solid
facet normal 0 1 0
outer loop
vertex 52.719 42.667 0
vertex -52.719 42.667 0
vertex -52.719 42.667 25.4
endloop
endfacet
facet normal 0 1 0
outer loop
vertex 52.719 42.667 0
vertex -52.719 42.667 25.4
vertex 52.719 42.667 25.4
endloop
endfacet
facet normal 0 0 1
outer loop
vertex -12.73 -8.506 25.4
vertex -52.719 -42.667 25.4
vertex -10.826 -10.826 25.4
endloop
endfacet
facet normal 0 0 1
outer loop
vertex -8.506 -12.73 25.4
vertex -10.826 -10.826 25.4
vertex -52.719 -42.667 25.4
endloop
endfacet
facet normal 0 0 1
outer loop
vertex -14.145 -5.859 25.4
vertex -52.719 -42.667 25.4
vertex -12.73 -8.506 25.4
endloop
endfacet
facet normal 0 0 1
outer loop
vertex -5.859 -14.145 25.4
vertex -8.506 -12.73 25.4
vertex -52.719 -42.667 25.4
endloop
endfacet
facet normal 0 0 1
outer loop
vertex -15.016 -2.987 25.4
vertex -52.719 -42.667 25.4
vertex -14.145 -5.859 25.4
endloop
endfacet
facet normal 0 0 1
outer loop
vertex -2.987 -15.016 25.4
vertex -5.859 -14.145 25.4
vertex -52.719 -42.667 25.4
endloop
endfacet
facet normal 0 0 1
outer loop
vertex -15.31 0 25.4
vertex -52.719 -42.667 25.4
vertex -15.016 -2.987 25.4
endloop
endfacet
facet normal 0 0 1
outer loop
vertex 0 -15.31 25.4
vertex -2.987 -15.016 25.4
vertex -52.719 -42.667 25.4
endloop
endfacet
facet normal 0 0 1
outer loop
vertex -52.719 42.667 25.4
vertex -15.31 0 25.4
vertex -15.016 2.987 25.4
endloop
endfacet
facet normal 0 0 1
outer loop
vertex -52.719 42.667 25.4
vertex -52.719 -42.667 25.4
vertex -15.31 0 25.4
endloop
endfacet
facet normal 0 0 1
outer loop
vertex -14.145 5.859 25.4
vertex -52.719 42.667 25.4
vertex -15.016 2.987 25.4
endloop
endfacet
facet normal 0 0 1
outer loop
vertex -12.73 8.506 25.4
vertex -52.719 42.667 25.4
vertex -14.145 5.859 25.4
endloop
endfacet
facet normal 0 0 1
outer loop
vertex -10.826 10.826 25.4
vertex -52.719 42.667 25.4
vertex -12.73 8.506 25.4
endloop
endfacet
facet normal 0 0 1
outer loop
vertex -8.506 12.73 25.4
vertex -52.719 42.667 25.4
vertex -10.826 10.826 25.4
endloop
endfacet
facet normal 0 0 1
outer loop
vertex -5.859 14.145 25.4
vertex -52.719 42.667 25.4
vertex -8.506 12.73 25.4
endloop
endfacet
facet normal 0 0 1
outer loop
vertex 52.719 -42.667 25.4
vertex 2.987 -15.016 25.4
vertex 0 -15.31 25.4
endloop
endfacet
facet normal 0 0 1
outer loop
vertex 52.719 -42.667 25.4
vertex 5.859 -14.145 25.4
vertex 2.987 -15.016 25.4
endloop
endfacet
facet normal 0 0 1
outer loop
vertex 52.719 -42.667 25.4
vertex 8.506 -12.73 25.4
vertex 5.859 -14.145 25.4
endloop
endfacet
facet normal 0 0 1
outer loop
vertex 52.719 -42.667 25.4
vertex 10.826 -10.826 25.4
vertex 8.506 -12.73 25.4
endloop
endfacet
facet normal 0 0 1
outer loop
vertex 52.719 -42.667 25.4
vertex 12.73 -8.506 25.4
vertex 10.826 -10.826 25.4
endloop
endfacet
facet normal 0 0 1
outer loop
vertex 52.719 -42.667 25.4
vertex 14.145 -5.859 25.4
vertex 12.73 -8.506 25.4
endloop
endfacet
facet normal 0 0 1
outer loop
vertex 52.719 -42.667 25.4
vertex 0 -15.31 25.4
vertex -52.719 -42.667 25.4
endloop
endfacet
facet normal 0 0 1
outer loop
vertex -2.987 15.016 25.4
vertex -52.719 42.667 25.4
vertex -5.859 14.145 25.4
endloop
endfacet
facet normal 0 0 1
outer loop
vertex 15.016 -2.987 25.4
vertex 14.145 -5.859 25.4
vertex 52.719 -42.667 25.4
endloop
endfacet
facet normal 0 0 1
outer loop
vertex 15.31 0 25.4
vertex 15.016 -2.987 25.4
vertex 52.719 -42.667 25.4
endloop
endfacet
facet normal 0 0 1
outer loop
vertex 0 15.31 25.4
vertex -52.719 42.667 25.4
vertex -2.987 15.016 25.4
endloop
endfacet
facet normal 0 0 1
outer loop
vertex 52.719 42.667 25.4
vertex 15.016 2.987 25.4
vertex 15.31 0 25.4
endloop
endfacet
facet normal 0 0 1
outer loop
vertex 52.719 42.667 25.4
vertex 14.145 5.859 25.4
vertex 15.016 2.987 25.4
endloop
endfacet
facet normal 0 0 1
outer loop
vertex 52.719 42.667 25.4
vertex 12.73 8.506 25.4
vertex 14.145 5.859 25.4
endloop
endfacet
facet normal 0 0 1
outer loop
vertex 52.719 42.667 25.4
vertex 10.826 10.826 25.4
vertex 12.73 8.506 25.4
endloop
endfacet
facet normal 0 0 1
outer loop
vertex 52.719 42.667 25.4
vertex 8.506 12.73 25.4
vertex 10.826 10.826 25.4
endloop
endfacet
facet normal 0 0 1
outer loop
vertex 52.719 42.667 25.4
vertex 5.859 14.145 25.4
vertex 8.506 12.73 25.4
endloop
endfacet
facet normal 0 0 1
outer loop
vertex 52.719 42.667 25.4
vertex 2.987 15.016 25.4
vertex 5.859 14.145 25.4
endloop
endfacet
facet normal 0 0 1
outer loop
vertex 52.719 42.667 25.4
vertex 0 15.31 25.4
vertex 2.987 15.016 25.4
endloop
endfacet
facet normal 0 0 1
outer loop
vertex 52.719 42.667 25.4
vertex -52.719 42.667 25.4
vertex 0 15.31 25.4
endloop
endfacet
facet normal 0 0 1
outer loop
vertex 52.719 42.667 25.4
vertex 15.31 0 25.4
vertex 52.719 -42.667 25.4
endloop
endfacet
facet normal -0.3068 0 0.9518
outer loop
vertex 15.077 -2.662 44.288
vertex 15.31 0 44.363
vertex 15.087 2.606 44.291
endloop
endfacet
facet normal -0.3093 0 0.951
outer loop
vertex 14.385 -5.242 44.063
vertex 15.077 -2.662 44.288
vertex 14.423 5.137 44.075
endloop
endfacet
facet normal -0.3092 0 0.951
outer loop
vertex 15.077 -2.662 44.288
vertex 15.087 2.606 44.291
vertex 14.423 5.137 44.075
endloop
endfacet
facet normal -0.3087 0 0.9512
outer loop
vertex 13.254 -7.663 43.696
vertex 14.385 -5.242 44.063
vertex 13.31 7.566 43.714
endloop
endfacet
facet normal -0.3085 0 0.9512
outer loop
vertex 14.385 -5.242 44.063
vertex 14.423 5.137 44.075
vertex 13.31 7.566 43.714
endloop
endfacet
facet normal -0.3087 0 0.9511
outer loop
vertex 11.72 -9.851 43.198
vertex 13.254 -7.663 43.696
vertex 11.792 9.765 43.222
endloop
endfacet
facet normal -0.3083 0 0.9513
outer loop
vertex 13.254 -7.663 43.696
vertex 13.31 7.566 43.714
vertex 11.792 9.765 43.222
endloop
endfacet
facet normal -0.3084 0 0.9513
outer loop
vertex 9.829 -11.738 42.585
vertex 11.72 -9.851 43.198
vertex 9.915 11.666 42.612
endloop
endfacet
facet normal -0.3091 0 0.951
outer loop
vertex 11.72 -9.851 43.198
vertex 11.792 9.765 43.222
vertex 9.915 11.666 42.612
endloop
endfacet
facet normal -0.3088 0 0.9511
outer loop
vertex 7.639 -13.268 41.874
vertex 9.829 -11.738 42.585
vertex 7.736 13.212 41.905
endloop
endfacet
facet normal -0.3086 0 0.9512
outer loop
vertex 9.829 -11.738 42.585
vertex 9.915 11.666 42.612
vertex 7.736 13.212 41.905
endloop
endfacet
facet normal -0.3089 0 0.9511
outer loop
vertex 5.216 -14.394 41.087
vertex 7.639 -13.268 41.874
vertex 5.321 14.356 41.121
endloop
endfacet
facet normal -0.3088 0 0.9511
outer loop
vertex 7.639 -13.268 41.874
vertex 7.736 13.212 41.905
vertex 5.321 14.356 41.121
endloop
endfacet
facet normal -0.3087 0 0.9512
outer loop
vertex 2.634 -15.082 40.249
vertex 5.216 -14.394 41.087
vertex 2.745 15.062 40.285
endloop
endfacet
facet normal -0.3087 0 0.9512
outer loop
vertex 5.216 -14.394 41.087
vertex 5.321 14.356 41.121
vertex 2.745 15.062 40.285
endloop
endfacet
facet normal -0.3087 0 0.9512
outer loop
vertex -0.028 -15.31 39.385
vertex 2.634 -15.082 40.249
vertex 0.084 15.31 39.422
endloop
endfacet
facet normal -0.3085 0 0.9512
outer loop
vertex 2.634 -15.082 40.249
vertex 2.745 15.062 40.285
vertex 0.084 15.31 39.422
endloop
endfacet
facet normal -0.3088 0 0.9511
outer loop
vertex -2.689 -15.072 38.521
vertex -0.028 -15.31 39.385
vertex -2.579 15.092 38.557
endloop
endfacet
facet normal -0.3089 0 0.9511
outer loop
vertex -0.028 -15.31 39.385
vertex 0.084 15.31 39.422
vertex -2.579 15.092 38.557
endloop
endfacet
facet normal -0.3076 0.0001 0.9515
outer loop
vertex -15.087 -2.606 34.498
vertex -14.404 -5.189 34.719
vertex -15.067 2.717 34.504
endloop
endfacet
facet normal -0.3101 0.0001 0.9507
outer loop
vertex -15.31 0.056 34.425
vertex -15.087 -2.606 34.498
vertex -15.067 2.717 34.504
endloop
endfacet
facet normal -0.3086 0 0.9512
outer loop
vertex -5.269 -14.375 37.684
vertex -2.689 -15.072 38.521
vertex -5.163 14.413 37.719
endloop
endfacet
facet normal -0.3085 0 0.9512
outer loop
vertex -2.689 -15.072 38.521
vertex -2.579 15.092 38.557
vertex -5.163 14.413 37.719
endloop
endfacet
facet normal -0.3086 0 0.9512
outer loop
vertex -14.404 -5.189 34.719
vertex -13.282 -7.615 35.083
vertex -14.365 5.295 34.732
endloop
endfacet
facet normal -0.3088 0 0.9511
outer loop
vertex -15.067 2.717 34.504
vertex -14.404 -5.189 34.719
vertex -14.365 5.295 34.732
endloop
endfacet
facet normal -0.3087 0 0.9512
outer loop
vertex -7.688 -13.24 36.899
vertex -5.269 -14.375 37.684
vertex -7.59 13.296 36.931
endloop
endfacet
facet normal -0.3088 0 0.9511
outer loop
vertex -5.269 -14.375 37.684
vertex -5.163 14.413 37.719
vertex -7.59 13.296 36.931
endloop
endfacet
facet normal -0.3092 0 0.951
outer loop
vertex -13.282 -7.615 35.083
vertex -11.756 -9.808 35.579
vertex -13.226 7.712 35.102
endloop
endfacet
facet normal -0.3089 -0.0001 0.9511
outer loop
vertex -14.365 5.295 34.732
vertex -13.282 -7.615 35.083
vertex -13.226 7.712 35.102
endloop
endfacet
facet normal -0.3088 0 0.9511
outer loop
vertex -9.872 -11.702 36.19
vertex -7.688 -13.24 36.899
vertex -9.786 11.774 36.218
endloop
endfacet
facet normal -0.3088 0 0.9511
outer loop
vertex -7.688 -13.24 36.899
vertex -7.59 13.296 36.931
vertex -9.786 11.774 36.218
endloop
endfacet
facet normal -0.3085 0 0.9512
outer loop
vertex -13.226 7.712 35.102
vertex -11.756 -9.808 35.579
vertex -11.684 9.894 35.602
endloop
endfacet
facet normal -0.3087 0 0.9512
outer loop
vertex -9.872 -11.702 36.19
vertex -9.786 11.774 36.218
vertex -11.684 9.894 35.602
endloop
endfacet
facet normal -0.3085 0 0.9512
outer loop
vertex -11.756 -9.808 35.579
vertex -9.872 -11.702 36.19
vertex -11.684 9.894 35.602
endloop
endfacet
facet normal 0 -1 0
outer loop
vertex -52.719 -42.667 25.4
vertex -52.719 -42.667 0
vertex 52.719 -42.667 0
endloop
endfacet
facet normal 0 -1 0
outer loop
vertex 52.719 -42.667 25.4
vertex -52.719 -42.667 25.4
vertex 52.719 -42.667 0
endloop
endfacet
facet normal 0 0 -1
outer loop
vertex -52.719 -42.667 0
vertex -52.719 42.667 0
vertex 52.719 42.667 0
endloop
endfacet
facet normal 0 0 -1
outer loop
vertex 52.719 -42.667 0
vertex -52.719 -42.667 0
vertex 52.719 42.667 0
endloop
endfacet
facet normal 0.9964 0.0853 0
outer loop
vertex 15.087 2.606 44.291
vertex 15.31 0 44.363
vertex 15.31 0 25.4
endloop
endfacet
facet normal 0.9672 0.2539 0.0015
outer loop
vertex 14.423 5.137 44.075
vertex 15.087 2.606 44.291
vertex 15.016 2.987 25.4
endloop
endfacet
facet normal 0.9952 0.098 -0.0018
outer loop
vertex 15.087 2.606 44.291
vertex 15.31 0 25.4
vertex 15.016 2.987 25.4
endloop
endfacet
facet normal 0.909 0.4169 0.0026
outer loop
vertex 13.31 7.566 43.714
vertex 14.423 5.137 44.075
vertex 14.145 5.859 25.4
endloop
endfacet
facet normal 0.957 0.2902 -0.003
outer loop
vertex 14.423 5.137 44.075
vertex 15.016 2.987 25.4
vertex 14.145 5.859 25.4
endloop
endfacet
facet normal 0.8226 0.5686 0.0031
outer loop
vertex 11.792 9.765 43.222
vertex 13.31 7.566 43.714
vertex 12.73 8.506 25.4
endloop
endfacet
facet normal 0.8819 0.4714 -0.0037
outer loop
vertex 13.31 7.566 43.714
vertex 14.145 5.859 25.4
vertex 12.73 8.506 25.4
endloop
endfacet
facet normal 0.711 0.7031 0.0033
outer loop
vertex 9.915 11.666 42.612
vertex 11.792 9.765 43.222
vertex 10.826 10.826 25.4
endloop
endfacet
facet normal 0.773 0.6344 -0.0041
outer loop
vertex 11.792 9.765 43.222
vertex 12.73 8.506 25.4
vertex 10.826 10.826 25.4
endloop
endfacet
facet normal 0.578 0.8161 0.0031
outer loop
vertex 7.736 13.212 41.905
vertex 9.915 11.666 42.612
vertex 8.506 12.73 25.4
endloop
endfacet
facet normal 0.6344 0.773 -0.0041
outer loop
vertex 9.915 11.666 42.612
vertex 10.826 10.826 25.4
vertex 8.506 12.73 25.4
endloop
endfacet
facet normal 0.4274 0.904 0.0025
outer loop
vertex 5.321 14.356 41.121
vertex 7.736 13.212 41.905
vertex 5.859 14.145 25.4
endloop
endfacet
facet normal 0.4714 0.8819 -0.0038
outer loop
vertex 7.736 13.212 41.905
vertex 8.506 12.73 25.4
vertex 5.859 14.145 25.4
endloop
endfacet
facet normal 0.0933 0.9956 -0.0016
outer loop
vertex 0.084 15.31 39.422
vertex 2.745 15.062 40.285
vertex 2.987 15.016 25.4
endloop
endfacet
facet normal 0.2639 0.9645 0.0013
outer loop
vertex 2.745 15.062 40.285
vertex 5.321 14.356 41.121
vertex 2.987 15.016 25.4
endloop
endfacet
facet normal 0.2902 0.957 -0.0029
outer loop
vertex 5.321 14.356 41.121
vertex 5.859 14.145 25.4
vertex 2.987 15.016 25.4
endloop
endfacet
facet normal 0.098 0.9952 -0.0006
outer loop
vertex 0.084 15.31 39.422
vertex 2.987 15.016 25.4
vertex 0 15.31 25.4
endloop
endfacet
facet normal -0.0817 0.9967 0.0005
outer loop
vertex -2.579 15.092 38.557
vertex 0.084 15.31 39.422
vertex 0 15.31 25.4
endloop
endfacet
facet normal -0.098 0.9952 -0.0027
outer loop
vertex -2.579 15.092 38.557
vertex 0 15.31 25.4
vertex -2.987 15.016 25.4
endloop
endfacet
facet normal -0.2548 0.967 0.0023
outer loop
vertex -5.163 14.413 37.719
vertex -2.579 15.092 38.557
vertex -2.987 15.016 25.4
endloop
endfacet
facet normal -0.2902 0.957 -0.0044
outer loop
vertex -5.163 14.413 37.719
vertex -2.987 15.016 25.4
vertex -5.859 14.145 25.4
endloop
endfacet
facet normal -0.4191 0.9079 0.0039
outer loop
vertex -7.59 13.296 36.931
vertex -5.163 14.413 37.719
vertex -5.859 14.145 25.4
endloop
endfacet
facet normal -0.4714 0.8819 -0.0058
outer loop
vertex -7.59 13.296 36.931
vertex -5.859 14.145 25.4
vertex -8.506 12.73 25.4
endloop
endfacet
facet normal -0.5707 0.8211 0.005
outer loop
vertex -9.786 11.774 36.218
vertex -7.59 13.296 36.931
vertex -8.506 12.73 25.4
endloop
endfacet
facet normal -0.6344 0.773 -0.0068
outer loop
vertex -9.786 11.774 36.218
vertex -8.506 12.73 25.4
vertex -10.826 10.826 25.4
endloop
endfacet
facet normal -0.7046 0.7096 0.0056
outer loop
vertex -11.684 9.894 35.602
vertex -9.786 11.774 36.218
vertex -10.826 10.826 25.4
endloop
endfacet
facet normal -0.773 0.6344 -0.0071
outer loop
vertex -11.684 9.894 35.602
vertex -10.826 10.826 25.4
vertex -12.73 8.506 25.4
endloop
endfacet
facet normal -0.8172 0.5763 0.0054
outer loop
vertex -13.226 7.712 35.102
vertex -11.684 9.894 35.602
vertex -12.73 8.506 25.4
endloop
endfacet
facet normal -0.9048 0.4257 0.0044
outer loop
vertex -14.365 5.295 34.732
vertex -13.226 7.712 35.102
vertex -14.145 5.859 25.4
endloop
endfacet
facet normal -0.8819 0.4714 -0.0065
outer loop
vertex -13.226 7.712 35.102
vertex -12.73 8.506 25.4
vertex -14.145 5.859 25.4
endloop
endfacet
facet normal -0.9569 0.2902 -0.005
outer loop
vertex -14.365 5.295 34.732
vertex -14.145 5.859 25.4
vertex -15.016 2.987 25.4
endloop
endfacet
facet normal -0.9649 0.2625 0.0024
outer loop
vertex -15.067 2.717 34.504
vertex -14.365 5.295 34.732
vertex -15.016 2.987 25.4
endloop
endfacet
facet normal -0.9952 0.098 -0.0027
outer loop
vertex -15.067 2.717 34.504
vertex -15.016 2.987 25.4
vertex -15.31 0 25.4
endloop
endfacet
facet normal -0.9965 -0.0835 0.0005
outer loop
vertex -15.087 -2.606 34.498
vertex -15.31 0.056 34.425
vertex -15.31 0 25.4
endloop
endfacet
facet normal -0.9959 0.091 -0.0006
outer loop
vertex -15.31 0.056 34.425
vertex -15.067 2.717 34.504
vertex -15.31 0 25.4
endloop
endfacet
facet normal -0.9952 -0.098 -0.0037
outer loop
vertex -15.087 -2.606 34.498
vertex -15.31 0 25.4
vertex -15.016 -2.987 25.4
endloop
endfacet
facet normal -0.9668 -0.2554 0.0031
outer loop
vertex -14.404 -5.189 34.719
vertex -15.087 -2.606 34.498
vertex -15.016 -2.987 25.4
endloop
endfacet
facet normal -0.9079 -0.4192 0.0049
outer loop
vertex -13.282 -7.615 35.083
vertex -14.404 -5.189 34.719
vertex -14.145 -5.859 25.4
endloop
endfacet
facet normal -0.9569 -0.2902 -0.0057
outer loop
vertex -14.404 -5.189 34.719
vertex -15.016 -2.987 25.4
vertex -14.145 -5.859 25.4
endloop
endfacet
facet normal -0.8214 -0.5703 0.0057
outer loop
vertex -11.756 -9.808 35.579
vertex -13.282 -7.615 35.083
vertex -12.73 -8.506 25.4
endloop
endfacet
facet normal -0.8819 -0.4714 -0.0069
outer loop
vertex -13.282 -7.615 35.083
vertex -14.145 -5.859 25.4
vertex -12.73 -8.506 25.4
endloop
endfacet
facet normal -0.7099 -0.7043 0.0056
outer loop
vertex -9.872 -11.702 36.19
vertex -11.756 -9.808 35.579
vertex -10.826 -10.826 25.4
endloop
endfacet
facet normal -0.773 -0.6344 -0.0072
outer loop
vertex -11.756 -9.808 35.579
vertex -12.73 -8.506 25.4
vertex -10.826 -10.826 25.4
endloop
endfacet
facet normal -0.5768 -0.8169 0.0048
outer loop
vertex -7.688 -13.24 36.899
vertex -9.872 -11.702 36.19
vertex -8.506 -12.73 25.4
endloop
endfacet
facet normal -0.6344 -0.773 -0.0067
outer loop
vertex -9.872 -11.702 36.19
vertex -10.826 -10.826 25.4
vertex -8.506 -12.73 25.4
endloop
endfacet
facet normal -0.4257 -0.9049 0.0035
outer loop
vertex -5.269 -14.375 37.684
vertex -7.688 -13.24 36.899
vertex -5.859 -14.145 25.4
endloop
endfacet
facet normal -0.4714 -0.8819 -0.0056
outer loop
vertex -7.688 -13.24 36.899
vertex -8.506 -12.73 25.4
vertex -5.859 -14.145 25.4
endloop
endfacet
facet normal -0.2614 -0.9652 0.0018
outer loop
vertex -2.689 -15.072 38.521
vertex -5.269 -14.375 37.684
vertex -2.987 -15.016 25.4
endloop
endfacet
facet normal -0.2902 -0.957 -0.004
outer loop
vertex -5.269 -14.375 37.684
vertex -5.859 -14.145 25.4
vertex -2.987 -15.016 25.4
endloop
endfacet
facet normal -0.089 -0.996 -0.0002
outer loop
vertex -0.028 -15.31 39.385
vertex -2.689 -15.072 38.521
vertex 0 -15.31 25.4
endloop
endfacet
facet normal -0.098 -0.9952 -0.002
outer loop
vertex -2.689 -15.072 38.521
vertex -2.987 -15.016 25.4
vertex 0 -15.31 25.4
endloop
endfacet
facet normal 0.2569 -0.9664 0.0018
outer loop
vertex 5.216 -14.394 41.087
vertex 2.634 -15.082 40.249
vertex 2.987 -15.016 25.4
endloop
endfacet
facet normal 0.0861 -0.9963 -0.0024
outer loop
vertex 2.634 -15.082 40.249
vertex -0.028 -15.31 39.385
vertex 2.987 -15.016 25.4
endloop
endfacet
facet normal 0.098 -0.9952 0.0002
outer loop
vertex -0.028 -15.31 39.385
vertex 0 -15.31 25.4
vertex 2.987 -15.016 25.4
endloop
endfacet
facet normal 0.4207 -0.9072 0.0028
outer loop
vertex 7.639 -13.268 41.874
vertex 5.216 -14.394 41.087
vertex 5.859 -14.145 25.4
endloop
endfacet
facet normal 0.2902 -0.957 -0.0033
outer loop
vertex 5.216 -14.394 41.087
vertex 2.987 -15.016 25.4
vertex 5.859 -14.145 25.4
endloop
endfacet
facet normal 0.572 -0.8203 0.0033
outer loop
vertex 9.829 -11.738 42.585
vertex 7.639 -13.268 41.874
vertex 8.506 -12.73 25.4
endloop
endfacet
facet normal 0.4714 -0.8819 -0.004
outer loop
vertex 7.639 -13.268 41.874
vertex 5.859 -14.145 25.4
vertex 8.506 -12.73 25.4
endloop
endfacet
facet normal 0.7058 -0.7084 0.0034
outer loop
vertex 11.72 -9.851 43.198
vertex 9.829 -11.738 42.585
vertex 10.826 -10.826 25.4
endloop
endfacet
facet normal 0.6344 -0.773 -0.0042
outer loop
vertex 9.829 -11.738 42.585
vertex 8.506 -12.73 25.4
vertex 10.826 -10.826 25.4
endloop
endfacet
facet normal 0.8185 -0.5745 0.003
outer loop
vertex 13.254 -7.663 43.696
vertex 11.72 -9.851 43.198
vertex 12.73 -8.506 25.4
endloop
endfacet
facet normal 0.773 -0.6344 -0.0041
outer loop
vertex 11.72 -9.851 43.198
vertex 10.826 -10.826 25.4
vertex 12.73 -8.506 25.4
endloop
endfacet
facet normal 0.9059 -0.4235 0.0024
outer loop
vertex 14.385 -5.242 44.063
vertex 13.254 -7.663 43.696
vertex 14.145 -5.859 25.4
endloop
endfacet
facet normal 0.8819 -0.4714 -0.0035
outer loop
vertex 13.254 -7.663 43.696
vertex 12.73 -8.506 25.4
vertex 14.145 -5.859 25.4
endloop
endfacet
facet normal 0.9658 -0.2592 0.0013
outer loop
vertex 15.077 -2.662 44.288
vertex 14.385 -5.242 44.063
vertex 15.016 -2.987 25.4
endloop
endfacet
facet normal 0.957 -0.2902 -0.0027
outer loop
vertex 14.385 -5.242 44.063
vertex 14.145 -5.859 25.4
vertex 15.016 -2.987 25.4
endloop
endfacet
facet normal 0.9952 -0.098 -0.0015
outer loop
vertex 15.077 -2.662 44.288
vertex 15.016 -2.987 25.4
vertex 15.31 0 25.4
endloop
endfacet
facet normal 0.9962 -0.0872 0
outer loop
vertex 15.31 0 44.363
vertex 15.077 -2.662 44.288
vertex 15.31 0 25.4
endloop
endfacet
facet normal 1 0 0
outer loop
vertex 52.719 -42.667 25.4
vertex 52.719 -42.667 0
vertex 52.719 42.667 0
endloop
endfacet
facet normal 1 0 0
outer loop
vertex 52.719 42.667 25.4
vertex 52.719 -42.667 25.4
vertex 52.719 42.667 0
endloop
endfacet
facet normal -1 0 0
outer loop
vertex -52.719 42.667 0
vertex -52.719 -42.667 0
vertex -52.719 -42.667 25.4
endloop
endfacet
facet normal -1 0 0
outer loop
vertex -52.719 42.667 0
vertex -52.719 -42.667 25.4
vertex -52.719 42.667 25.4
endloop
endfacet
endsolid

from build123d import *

# Parameters (mm, degrees)
F0_W     = 105.438776
F0_H     = 85.334472
F1_DEPTH = 25.4
F2_R     = 15.310247
F3_DEPTH = 25.4
F5_DEPTH = 87.376


with BuildPart() as f1:
    # F0 (on Top) → F1 (new body)
    with BuildSketch(Plane.XY):
        Rectangle(F0_W, F0_H)
    extrude(amount=F1_DEPTH)

    # F2 (on face) → F3 (join)
    with BuildSketch(Plane.XY.offset(25.4)):
        Circle(F2_R)
    extrude(amount=F3_DEPTH)

    # F4 (on face) → F5 (cut)
    with BuildSketch(Plane(origin=(0, 42.667236, 0), x_dir=(-1, 0, 0), z_dir=(0, 1, 0))):
        Polygon((-27.478183, 63.615456), (-29.094545, 48.837271), (23.552727, 31.750001), (32.437156, 59.123653), align=None)
    extrude(amount=-F5_DEPTH, mode=Mode.SUBTRACT)


solid = f1.part
